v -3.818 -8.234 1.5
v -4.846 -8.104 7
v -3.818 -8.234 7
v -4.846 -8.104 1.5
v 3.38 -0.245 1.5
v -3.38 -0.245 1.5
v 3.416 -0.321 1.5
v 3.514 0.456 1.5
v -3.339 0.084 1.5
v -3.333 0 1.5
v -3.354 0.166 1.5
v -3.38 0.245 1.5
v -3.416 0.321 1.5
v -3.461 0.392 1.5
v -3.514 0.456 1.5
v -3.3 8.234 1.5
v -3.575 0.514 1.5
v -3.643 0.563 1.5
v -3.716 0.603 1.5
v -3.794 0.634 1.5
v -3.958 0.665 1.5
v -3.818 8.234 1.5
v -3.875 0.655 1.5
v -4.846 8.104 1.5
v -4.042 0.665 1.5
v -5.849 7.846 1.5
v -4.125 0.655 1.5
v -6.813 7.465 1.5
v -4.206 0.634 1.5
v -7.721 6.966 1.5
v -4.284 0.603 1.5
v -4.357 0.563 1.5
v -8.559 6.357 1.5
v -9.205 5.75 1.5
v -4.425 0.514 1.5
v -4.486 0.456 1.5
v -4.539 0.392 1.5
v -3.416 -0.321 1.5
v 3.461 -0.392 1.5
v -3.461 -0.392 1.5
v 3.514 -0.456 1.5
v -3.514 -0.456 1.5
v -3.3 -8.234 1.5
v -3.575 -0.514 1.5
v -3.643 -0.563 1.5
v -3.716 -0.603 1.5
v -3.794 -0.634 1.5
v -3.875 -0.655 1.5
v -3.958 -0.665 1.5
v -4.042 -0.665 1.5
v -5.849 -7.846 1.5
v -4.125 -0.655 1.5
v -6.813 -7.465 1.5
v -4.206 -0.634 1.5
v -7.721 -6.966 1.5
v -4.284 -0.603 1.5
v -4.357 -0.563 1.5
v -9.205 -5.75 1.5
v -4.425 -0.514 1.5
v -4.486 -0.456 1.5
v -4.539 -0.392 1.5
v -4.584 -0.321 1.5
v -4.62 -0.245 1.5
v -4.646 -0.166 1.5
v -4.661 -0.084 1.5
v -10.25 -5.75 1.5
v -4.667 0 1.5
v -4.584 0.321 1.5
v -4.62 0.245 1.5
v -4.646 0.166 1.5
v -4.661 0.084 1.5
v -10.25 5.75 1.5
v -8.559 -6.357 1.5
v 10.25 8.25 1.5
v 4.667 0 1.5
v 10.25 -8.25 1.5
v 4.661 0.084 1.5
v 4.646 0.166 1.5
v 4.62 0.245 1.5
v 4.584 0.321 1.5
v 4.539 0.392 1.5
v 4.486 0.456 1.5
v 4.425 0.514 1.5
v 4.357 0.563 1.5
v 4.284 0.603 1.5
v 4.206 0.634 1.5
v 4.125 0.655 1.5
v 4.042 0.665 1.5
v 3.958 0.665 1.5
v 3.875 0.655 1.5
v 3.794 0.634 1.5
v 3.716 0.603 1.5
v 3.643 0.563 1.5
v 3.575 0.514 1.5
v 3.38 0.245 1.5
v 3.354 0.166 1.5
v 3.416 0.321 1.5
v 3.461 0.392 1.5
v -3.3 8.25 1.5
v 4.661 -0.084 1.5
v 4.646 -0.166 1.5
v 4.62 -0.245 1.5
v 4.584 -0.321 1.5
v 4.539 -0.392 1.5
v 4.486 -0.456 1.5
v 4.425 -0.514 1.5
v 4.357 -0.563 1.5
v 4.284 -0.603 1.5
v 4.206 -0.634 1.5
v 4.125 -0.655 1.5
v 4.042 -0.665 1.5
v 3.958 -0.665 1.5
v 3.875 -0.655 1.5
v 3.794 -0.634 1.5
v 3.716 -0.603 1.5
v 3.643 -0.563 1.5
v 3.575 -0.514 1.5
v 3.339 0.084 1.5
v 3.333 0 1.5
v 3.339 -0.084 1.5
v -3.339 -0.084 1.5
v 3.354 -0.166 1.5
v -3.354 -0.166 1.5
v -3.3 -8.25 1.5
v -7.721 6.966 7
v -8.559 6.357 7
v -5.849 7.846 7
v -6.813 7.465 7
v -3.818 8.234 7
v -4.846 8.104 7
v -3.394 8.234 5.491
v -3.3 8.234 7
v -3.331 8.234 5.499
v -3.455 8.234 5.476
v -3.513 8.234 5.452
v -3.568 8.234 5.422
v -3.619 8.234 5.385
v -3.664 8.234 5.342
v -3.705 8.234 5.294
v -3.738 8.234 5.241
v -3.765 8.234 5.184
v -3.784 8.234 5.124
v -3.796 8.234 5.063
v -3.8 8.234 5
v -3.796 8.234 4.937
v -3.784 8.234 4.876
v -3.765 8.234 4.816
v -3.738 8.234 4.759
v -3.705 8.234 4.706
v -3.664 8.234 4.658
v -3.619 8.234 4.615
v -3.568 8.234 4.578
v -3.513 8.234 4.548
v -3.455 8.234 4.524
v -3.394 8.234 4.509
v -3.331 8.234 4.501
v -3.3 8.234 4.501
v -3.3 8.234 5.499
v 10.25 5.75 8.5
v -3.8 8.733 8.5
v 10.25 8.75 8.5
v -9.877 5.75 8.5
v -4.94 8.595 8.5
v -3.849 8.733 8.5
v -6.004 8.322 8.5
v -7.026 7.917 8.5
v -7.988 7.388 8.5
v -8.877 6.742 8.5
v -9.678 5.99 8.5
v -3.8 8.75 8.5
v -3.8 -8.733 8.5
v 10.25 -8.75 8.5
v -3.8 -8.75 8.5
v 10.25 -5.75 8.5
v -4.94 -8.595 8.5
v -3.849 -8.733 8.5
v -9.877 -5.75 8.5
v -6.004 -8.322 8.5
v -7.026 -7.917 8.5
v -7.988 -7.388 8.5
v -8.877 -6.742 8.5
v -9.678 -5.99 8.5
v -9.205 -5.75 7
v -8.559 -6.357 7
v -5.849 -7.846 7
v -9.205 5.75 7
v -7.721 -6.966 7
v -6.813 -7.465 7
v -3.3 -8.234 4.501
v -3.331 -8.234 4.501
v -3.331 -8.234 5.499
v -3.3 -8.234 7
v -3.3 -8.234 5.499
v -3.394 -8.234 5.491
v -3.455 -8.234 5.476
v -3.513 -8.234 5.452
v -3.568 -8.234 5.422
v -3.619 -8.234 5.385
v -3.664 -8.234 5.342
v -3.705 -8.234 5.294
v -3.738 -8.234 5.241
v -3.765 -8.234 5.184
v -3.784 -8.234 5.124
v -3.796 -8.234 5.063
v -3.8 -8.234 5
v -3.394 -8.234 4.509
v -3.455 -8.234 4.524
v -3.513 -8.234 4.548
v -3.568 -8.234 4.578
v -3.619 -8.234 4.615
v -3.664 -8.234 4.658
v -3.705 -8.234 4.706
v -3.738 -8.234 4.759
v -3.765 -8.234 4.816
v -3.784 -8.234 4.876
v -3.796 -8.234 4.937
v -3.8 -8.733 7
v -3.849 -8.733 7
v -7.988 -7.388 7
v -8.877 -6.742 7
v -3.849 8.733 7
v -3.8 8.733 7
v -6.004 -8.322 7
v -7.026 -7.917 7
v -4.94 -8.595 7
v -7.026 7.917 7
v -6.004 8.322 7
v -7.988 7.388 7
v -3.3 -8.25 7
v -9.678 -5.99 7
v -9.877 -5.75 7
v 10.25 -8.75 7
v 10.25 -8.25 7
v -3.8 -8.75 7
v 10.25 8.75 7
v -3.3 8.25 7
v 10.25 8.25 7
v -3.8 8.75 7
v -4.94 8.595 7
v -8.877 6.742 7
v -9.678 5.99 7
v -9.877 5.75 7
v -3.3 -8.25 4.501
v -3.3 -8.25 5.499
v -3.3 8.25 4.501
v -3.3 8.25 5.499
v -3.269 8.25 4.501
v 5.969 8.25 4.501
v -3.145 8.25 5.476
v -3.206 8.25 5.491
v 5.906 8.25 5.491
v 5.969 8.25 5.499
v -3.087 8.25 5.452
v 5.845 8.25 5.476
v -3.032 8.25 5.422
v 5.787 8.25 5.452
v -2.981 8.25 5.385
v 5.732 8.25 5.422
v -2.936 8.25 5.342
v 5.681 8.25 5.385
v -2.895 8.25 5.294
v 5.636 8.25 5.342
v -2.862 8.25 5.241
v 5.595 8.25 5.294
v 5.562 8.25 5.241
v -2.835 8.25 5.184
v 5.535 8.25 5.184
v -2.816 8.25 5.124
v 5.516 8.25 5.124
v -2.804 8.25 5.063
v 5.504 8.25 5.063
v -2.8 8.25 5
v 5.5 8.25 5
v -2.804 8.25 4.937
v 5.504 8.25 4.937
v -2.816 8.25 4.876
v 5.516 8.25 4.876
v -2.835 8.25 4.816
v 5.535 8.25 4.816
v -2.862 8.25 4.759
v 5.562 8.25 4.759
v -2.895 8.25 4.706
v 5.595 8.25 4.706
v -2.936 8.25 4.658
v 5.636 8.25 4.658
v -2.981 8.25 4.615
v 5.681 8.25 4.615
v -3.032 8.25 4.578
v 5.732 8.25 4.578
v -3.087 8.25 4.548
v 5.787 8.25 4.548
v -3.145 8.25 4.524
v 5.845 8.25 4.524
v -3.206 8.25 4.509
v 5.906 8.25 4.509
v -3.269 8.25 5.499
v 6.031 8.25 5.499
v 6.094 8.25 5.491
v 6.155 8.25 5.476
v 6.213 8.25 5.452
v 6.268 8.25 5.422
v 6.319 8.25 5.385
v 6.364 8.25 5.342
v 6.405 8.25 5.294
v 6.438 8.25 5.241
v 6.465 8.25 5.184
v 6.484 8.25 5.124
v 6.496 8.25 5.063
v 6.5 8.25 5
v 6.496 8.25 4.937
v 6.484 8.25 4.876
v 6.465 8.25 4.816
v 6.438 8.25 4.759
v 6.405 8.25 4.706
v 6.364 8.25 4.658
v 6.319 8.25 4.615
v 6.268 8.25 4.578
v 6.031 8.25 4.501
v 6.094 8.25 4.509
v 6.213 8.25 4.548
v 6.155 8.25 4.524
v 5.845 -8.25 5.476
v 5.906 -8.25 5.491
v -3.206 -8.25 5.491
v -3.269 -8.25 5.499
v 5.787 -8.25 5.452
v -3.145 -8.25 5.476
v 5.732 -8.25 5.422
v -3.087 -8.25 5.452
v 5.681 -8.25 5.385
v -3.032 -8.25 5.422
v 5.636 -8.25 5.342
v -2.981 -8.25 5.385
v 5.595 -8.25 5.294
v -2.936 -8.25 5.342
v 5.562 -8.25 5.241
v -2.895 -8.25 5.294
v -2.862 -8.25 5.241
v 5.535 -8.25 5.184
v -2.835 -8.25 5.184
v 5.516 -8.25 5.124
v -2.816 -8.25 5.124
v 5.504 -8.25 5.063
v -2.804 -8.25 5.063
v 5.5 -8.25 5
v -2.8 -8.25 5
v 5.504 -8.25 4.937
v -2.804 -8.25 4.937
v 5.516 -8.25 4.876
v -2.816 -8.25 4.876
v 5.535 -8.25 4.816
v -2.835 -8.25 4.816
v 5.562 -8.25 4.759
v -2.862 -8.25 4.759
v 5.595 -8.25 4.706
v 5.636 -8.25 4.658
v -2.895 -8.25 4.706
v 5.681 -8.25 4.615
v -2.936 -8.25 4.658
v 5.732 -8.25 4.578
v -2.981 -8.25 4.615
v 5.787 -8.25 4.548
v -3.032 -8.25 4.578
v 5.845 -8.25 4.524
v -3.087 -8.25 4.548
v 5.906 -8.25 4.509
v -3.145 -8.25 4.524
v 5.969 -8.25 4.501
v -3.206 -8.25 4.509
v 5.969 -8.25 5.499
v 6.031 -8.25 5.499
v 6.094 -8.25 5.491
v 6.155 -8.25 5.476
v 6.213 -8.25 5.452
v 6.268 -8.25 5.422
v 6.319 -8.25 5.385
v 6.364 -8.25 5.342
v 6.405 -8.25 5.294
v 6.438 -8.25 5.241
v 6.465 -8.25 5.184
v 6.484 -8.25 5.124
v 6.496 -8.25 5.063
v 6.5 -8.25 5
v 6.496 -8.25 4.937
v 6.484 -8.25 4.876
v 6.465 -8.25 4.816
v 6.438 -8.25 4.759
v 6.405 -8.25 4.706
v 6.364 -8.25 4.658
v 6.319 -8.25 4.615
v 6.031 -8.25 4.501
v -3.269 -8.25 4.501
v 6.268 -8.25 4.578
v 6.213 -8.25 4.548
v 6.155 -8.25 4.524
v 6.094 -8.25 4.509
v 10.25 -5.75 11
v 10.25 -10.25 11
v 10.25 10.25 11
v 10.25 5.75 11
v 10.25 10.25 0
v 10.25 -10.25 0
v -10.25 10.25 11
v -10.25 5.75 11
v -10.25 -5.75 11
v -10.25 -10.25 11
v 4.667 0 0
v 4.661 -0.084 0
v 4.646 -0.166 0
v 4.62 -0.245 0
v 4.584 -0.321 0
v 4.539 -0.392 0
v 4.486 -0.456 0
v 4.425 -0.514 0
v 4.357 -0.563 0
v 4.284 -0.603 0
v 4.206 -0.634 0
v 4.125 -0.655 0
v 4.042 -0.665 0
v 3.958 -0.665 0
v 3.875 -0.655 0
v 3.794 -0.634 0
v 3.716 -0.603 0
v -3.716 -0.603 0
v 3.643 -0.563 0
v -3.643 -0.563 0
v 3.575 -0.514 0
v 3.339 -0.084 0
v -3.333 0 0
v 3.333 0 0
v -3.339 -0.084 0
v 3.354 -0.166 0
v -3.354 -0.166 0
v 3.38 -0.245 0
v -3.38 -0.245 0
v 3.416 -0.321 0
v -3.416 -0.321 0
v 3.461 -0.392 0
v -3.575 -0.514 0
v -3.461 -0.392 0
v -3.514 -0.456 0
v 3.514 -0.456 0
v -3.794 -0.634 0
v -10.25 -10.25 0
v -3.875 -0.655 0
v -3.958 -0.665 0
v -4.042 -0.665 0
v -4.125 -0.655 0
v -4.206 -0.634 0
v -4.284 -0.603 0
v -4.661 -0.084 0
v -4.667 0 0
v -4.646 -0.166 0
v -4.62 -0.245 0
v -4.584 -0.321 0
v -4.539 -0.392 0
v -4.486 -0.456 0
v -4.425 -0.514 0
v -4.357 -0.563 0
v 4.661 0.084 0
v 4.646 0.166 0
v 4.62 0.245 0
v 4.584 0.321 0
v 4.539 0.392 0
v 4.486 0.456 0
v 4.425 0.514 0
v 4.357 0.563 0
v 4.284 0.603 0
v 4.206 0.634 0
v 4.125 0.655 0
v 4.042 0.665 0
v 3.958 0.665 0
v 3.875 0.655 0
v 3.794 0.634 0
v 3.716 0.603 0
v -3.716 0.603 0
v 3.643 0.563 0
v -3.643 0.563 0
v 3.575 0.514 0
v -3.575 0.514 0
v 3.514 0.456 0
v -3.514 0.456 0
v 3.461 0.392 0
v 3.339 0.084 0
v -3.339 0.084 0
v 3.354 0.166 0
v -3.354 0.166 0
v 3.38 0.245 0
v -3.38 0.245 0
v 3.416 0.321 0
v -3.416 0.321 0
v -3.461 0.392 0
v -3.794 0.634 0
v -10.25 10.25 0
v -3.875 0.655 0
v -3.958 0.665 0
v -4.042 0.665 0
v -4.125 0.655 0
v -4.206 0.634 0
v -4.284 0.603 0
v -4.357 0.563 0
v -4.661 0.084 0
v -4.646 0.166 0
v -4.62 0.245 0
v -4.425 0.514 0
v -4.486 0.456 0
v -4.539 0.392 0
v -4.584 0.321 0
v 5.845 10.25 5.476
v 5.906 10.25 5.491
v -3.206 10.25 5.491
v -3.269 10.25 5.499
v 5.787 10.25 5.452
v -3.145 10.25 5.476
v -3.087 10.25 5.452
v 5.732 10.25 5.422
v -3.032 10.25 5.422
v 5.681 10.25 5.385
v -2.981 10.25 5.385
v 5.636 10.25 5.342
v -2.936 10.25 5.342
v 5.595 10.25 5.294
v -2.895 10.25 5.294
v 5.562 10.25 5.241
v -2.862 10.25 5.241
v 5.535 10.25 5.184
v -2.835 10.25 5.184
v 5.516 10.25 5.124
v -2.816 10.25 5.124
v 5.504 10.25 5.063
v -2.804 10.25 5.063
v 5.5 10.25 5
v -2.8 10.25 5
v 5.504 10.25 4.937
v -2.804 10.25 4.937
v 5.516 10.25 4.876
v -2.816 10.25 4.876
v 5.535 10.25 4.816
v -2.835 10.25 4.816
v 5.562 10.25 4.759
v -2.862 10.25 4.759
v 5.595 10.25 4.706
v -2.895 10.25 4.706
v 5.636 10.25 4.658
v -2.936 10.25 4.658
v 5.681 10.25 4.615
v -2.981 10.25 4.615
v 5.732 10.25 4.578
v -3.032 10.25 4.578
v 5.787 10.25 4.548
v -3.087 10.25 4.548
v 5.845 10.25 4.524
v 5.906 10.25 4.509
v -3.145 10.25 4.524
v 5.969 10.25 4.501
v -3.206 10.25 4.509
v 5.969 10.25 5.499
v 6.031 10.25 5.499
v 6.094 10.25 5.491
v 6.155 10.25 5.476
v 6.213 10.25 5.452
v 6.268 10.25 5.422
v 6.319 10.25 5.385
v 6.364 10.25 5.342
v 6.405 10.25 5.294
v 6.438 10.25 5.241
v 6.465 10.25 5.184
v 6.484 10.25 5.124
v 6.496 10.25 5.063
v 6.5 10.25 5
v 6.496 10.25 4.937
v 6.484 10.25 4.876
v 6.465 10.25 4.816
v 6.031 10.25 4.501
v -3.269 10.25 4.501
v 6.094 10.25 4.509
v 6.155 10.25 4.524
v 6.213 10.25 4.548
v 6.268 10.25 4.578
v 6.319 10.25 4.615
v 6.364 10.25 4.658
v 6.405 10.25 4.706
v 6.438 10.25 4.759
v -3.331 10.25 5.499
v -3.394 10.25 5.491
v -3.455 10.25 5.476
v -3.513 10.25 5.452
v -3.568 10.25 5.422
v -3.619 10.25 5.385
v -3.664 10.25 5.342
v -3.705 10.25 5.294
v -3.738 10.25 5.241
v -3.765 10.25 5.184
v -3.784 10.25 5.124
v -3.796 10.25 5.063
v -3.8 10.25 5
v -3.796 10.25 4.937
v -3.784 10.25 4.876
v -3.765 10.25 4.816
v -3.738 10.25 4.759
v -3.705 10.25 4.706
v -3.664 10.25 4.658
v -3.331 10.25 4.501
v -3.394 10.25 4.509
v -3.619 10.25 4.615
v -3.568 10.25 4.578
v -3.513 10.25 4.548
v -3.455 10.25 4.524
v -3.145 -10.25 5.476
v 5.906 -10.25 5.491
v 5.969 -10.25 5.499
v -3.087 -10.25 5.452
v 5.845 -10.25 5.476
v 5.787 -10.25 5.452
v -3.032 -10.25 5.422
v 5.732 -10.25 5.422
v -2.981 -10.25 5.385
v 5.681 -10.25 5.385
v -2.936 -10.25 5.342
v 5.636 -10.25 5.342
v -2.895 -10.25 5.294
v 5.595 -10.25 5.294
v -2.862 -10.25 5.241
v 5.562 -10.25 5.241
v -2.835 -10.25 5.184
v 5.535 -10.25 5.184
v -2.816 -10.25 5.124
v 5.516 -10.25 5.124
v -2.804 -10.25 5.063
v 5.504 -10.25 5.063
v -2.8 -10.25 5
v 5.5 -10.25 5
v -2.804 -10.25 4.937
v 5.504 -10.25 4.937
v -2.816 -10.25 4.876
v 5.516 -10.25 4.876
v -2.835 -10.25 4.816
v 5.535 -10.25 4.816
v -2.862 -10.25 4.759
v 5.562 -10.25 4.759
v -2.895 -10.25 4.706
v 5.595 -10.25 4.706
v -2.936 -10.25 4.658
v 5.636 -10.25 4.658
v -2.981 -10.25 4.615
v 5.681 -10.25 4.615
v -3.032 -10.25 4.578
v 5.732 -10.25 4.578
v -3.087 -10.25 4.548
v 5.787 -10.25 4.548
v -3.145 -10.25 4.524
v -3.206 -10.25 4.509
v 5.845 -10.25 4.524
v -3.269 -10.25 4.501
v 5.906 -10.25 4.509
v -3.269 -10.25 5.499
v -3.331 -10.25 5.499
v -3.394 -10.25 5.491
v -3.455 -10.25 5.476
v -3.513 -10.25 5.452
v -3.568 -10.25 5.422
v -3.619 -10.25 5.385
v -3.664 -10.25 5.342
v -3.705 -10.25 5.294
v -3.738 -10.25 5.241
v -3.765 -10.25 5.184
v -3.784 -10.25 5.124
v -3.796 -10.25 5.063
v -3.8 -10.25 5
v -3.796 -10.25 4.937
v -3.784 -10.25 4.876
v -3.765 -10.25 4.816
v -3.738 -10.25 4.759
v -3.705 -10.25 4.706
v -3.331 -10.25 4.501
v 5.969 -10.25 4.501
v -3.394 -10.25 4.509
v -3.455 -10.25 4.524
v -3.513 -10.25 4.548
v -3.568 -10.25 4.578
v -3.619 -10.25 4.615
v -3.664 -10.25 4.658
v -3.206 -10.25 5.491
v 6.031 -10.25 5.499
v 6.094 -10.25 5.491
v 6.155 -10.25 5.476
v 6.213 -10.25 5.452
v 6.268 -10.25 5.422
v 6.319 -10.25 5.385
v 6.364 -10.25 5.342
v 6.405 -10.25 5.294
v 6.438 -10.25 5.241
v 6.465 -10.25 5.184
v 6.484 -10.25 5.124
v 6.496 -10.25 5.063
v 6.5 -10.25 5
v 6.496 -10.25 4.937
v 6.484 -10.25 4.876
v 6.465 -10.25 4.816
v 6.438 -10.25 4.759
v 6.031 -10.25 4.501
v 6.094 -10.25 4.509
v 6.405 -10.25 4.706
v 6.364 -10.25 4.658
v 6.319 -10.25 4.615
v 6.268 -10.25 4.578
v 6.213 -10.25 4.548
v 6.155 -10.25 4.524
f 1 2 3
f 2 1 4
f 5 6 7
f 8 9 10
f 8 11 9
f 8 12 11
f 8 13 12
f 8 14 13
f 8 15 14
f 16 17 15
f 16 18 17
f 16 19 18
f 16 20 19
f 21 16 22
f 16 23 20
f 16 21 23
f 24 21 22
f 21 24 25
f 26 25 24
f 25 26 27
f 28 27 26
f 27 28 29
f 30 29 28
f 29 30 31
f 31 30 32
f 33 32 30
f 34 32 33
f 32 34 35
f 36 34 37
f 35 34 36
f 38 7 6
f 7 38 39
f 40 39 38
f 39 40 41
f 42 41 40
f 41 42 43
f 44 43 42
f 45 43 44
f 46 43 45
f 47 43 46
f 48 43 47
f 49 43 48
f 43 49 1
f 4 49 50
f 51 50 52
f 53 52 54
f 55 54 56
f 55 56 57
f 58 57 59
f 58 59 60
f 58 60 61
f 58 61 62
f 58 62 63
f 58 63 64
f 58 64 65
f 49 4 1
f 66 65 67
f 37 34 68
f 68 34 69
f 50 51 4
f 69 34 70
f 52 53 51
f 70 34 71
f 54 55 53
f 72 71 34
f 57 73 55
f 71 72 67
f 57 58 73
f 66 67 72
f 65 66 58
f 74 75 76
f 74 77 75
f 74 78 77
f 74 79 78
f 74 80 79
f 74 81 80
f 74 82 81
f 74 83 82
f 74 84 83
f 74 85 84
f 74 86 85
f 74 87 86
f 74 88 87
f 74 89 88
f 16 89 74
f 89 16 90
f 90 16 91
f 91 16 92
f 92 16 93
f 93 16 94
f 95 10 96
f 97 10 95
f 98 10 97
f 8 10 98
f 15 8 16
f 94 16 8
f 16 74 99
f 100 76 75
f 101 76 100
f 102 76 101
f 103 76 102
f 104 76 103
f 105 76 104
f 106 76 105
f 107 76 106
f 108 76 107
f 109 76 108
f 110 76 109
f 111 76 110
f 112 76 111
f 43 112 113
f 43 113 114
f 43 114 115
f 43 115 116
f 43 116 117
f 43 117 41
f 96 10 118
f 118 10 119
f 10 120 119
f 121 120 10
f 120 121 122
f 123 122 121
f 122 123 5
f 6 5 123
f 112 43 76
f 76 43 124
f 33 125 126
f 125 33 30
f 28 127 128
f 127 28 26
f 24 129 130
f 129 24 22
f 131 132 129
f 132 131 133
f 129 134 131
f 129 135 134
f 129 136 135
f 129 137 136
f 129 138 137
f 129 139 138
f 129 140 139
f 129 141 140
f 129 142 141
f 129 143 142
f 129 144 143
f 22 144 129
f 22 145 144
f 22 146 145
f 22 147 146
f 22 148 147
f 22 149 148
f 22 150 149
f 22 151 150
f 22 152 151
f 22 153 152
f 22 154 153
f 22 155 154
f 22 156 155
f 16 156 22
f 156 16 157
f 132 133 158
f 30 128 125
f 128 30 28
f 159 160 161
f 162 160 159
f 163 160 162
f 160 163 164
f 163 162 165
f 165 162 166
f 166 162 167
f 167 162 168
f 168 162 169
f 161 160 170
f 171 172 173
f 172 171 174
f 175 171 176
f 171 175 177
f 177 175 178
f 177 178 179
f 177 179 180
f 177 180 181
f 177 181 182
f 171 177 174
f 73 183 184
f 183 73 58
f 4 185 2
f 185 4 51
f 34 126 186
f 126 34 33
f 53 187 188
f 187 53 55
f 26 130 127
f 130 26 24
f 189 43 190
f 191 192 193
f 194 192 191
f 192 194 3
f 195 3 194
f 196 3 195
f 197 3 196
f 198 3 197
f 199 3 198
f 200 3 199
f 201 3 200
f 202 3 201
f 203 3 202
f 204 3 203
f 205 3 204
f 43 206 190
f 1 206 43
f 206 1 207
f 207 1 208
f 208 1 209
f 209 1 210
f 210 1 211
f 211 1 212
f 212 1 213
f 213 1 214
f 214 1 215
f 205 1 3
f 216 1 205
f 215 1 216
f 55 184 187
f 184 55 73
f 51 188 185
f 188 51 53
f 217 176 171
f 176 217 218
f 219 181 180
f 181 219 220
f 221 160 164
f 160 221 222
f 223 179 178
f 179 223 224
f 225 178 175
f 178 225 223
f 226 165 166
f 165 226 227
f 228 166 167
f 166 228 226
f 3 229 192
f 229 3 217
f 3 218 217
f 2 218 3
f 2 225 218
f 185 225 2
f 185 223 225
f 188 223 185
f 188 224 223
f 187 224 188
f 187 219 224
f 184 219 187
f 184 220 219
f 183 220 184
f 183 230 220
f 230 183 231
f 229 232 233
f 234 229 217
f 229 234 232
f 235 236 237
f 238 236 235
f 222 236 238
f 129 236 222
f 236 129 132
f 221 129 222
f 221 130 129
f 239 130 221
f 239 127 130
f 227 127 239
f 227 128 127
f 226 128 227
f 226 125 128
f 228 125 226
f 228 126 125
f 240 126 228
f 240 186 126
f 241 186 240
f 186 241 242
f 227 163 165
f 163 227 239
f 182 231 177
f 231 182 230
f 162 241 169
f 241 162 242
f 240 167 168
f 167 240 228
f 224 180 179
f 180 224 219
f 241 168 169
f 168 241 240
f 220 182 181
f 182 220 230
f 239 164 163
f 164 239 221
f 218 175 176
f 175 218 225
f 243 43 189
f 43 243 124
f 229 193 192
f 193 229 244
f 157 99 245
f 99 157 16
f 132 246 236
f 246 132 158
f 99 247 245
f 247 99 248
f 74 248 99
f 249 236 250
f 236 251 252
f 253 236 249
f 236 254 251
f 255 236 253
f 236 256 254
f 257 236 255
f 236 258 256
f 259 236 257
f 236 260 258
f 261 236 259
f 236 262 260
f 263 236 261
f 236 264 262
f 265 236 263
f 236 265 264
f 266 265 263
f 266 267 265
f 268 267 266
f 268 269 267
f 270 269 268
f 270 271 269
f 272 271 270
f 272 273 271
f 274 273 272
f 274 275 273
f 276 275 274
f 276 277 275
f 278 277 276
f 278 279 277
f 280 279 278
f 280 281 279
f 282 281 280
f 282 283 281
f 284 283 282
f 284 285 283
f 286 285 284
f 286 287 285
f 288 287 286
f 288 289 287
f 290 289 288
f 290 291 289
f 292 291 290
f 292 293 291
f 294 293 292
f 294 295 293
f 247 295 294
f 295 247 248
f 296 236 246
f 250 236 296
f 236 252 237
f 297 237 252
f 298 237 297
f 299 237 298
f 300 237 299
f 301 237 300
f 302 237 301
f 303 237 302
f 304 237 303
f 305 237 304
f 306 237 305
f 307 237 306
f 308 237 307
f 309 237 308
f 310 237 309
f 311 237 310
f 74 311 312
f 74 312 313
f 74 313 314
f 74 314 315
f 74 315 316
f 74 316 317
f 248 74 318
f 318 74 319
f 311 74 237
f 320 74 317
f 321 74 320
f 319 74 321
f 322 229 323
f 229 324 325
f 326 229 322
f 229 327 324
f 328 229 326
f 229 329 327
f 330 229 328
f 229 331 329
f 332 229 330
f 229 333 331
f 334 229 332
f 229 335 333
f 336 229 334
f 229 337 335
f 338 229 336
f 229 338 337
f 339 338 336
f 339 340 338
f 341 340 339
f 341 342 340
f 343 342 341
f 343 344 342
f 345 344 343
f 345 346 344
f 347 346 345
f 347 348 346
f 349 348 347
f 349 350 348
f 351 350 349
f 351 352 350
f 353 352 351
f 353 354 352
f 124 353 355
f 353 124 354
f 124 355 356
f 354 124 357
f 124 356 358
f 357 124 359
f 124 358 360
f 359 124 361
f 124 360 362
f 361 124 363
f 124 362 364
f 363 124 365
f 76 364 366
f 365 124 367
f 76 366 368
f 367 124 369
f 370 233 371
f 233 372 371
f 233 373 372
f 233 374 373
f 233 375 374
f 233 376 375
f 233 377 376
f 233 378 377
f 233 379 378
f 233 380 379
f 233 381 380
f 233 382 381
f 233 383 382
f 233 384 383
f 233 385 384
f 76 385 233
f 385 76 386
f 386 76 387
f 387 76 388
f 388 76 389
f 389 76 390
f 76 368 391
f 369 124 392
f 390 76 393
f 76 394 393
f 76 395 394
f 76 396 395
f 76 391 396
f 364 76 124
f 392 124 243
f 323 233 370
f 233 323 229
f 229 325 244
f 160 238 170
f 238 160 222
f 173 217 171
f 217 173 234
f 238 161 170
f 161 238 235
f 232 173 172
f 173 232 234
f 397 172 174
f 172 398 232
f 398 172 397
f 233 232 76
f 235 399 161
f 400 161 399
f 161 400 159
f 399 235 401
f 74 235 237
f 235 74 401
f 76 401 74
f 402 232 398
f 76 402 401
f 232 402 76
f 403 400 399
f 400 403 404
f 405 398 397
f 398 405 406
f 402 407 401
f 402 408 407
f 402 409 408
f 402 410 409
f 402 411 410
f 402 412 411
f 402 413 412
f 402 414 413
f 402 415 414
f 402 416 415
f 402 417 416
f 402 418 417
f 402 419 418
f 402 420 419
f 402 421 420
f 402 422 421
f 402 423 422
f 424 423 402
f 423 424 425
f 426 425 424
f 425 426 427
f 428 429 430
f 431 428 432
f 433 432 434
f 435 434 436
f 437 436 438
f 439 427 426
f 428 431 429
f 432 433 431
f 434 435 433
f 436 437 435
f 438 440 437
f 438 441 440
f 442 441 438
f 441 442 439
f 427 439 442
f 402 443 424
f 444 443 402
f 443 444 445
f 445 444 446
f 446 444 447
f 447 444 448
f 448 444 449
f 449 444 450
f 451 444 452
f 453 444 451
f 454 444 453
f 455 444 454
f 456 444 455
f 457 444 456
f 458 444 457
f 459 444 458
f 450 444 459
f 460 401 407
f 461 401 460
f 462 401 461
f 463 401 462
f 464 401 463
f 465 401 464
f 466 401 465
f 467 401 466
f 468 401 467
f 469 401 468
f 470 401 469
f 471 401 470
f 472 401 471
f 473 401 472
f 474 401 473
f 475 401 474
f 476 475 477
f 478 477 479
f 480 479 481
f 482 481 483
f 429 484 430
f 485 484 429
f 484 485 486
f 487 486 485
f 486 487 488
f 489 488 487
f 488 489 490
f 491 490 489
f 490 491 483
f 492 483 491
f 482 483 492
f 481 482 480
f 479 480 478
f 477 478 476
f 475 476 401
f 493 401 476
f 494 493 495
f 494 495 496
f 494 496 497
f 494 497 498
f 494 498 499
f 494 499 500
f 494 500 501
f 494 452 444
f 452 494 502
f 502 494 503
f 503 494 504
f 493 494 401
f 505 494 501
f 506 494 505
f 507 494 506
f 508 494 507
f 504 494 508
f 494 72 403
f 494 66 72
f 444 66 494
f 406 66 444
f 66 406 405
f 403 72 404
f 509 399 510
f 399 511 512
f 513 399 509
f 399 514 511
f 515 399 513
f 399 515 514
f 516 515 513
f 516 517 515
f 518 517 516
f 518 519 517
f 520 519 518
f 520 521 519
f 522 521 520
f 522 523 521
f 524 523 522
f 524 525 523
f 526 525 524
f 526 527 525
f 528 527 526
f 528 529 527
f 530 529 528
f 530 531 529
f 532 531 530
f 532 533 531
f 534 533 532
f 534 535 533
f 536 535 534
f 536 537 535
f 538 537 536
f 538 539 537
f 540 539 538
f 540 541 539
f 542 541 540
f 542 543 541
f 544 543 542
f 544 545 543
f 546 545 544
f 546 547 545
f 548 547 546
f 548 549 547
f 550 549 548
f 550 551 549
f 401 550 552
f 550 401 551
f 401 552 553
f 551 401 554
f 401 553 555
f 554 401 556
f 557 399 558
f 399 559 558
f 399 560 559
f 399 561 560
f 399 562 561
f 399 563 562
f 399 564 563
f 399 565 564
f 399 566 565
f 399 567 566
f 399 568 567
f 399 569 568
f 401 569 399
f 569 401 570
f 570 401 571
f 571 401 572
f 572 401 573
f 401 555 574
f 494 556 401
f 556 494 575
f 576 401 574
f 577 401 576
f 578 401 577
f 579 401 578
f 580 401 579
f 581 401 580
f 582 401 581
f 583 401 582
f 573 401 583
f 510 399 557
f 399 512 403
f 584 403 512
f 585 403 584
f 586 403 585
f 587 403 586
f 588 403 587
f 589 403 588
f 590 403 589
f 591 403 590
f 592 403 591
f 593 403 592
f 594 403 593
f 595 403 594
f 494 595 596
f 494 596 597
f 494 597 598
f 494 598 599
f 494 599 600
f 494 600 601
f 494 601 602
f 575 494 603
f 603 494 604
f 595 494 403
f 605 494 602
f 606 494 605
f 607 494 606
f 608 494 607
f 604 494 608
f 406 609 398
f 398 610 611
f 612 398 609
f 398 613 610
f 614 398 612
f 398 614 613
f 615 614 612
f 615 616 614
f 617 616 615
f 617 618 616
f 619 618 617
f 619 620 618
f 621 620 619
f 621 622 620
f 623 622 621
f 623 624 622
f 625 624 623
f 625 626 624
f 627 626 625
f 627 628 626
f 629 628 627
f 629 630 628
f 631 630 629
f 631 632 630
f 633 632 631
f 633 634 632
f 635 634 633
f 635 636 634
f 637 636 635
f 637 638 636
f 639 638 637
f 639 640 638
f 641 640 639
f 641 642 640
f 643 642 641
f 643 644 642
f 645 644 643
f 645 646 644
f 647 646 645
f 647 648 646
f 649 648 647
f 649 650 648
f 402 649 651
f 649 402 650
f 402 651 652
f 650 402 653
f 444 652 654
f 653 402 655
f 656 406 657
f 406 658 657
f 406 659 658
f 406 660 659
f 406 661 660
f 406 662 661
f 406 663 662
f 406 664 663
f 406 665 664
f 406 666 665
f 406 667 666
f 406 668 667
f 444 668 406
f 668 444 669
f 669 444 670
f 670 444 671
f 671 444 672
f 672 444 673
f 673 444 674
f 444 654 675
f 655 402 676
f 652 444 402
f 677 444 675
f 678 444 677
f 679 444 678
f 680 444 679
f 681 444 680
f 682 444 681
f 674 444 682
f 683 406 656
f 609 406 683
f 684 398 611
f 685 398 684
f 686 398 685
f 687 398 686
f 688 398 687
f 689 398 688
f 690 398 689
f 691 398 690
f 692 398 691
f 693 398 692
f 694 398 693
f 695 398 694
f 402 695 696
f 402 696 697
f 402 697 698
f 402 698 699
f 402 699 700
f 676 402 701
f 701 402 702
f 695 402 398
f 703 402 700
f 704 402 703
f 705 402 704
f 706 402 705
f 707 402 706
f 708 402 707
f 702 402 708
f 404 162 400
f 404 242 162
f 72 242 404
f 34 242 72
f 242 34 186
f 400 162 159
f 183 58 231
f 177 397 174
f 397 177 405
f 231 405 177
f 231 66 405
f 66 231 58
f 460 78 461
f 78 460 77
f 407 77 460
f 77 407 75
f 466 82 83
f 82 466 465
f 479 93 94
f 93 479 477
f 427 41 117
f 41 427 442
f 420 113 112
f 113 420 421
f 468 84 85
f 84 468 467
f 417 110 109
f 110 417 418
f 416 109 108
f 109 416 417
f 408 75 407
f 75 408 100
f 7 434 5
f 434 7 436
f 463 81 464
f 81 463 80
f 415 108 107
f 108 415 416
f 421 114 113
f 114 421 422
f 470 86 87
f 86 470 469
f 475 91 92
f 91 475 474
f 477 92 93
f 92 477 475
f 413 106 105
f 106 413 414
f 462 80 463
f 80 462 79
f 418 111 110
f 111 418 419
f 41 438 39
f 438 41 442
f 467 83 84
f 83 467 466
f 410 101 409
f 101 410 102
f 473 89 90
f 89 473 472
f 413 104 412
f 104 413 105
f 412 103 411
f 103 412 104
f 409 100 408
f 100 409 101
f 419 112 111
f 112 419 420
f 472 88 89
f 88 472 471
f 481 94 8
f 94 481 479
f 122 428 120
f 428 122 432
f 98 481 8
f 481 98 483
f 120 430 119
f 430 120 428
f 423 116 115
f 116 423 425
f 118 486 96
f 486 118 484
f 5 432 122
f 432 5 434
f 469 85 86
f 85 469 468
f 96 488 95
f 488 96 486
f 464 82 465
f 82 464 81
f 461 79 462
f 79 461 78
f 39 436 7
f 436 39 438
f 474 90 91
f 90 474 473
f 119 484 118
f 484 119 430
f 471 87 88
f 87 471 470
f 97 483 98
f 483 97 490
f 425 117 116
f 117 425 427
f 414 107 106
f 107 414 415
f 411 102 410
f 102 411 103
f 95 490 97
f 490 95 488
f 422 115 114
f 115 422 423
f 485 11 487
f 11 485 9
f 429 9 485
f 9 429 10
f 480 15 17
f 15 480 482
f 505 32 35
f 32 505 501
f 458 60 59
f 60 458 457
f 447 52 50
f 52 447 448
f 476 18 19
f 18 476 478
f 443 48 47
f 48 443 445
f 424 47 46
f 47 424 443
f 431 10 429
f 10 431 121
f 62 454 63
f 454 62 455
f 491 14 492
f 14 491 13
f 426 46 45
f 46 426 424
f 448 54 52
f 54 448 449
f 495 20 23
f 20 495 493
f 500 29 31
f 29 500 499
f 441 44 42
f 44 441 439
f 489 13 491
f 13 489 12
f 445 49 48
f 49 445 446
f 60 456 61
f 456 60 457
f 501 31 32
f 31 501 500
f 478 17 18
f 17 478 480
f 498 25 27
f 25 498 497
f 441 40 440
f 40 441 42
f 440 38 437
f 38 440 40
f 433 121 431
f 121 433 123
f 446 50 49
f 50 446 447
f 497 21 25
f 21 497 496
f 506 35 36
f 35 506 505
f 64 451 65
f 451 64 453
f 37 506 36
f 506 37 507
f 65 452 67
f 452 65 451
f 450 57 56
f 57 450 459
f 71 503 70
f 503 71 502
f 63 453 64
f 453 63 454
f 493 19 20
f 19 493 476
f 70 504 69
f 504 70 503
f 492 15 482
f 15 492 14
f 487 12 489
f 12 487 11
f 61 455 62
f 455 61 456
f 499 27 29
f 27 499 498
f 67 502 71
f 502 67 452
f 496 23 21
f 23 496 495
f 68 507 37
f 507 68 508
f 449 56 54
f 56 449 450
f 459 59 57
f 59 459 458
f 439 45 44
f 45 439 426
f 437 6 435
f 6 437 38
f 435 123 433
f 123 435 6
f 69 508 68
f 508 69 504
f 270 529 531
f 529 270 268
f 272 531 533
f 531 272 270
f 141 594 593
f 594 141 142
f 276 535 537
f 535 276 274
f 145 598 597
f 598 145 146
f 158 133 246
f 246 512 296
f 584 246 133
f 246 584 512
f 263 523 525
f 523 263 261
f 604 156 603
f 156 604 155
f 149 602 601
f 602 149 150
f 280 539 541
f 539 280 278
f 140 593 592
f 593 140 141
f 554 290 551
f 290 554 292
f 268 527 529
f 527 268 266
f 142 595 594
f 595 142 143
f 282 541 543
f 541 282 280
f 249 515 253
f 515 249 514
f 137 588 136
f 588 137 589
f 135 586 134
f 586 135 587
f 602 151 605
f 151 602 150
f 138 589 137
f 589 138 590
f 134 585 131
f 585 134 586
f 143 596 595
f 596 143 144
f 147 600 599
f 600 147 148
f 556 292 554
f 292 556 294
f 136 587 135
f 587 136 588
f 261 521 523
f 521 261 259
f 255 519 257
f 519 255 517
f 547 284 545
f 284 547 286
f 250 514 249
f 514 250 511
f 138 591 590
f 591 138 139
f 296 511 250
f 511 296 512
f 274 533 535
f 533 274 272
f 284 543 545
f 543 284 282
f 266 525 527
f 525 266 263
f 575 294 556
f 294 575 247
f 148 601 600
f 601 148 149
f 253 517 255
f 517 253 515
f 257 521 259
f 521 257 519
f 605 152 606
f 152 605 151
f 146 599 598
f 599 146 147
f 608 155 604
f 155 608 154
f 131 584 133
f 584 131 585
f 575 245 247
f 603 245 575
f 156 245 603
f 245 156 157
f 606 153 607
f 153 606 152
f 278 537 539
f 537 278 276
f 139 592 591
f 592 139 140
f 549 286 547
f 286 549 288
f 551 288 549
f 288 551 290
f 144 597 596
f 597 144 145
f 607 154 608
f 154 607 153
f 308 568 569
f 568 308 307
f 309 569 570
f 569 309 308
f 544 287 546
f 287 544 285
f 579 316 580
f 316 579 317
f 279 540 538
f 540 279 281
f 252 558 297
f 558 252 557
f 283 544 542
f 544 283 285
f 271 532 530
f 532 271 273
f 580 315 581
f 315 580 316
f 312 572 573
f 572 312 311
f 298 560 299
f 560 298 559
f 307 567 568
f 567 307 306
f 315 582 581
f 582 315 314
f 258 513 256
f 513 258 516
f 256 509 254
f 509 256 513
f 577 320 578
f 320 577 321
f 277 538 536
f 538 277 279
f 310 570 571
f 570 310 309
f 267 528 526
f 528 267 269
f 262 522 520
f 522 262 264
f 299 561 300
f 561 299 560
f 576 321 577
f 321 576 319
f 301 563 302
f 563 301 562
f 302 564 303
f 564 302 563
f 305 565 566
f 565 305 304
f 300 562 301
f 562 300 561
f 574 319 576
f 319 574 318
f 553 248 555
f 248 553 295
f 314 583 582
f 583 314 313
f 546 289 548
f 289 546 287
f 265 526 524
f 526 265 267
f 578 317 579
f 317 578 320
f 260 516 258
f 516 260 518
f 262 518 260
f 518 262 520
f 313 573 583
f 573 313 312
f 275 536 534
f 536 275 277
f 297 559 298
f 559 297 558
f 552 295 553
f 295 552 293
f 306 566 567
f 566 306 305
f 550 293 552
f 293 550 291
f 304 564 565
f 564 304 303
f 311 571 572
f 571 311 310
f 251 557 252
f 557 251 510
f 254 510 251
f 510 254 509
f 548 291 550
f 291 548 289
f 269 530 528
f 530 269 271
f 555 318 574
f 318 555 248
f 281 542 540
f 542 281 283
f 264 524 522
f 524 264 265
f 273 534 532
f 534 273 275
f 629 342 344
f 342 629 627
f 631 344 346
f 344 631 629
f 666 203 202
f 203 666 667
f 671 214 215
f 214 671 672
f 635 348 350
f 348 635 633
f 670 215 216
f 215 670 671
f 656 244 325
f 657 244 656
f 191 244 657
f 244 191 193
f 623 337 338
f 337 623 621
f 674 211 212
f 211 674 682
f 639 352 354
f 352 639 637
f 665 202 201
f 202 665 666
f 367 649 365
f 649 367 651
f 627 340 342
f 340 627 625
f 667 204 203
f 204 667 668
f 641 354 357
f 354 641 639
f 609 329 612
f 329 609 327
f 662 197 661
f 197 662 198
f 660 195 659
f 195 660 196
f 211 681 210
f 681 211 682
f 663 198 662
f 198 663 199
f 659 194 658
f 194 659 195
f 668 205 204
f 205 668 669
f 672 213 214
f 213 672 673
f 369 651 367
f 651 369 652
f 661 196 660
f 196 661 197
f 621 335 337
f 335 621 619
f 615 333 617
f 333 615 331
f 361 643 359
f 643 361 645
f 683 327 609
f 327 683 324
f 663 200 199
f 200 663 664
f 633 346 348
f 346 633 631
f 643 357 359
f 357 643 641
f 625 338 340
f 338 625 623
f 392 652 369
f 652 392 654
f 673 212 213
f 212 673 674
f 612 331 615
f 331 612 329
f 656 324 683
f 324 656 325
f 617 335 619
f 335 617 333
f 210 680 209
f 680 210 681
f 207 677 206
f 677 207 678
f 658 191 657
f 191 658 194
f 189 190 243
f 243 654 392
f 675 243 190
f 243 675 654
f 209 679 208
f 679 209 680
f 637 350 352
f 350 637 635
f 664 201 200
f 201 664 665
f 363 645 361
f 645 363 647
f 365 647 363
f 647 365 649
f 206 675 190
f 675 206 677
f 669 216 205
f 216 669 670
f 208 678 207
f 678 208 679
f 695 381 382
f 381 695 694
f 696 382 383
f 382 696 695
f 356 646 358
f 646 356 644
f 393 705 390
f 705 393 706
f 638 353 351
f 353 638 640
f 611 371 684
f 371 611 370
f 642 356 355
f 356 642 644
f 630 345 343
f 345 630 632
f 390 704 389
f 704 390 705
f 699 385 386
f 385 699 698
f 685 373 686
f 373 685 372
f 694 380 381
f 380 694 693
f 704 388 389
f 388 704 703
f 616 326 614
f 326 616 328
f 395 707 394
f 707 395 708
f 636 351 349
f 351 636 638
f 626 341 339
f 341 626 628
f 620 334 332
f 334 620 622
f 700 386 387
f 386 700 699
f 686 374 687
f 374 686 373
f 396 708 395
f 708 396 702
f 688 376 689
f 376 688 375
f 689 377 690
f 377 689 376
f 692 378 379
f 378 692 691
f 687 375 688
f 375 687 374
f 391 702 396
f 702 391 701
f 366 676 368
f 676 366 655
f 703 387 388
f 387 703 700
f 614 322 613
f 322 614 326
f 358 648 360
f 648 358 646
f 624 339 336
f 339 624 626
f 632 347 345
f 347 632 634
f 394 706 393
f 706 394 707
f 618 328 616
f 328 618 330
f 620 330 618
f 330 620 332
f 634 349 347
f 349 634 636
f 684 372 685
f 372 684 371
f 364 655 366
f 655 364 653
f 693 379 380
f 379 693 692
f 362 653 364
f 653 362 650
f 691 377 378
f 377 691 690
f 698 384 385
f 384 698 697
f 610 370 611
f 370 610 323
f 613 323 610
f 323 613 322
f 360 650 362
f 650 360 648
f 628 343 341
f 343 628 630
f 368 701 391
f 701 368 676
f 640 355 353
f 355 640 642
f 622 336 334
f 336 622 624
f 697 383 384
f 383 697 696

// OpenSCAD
$fn=50;




ts=1.5; // толщина стенки
tp=1;//диаметр жилы
tpr=1.7;//диаметр провода
dd=0.3;
pin=[0.65+dd,0.65+dd,11.5];
lin=[10,60,3];//ширина, длина, толщина
ds=[16.5,17.5,6,1];




all1();
module all1(){
    difference(){
        translate([0,0,(ds.z+2*ts+2*tp)/2]) cube([ds.y+2*ts,ds.y+2*ts,ds.z+2*ts+2*tp],true);
        translate([-ds.x/5,0,ts]) {
            cylinder(ds.z+tp,ds.x/2,ds.x/2 );
            translate([0,0,ds.z+tp-ts]) cylinder(ts,ds.y/2,ds.y/2 );
            translate([ds.x/2,0,(ds.z+tp)/2]) cube([ds.x,ds.x,ds.z+tp],true);
            translate([ds.x/2,0,(ds.z+tp-ts)+ts/2]) cube([ds.y,ds.y,ts],true);
        }
        translate([0,0,(ds.z+2*ts+2*tp)/2+ts]) cube([ds.y+3*ts,ds.y-4*ts,ds.z+2*ts+2*tp],true);
        translate([4,0,-ts]) cylinder(5*ts,tp/1.5,tp/1.5 );
        translate([-4,0,-ts]) cylinder(5*ts,tp/1.5,tp/1.5 );
        translate([-ds.x/5,ds.y/2+3*ts, (ds.z+tp)/2+ts]) rotate([90,0,0])cylinder(6*ts,tp/2,tp/2 );
        translate([6,ds.y/2+3*ts, (ds.z+tp)/2+ts]) rotate([90,0,0])cylinder(6*ts,tp/2,tp/2 );
        translate([-ds.x/5,-(ds.y/2-3*ts), (ds.z+tp)/2+ts]) rotate([90,0,0])cylinder(6*ts,tp/2,tp/2 );
        translate([6,-(ds.y/2-3*ts), (ds.z+tp)/2+ts]) rotate([90,0,0])cylinder(6*ts,tp/2,tp/2 );  
    }
}


//all();
module all(){
    difference(){
        union(){
            translate([0,lin.y/2,(ts+lin.z)/2]) cube([lin.x+2*ts,lin.y,lin.z+ts],true);
            translate([lin.x/2,0,(ts+lin.z)/2]) rotate([0,0,45])cube([pin.x*6,pin.y*6,lin.z+ts],true);
        }
        translate([0,lin.y/2,(ts+lin.z)/2+ts/2]) cube([lin.x,lin.y*2,lin.z+ts],true);
        translate([lin.x/2,0,(ts+lin.z)/2+ts/2]) rotate([0,0,45])cube([pin.x,pin.z,lin.z+ts],true);

    }
}
